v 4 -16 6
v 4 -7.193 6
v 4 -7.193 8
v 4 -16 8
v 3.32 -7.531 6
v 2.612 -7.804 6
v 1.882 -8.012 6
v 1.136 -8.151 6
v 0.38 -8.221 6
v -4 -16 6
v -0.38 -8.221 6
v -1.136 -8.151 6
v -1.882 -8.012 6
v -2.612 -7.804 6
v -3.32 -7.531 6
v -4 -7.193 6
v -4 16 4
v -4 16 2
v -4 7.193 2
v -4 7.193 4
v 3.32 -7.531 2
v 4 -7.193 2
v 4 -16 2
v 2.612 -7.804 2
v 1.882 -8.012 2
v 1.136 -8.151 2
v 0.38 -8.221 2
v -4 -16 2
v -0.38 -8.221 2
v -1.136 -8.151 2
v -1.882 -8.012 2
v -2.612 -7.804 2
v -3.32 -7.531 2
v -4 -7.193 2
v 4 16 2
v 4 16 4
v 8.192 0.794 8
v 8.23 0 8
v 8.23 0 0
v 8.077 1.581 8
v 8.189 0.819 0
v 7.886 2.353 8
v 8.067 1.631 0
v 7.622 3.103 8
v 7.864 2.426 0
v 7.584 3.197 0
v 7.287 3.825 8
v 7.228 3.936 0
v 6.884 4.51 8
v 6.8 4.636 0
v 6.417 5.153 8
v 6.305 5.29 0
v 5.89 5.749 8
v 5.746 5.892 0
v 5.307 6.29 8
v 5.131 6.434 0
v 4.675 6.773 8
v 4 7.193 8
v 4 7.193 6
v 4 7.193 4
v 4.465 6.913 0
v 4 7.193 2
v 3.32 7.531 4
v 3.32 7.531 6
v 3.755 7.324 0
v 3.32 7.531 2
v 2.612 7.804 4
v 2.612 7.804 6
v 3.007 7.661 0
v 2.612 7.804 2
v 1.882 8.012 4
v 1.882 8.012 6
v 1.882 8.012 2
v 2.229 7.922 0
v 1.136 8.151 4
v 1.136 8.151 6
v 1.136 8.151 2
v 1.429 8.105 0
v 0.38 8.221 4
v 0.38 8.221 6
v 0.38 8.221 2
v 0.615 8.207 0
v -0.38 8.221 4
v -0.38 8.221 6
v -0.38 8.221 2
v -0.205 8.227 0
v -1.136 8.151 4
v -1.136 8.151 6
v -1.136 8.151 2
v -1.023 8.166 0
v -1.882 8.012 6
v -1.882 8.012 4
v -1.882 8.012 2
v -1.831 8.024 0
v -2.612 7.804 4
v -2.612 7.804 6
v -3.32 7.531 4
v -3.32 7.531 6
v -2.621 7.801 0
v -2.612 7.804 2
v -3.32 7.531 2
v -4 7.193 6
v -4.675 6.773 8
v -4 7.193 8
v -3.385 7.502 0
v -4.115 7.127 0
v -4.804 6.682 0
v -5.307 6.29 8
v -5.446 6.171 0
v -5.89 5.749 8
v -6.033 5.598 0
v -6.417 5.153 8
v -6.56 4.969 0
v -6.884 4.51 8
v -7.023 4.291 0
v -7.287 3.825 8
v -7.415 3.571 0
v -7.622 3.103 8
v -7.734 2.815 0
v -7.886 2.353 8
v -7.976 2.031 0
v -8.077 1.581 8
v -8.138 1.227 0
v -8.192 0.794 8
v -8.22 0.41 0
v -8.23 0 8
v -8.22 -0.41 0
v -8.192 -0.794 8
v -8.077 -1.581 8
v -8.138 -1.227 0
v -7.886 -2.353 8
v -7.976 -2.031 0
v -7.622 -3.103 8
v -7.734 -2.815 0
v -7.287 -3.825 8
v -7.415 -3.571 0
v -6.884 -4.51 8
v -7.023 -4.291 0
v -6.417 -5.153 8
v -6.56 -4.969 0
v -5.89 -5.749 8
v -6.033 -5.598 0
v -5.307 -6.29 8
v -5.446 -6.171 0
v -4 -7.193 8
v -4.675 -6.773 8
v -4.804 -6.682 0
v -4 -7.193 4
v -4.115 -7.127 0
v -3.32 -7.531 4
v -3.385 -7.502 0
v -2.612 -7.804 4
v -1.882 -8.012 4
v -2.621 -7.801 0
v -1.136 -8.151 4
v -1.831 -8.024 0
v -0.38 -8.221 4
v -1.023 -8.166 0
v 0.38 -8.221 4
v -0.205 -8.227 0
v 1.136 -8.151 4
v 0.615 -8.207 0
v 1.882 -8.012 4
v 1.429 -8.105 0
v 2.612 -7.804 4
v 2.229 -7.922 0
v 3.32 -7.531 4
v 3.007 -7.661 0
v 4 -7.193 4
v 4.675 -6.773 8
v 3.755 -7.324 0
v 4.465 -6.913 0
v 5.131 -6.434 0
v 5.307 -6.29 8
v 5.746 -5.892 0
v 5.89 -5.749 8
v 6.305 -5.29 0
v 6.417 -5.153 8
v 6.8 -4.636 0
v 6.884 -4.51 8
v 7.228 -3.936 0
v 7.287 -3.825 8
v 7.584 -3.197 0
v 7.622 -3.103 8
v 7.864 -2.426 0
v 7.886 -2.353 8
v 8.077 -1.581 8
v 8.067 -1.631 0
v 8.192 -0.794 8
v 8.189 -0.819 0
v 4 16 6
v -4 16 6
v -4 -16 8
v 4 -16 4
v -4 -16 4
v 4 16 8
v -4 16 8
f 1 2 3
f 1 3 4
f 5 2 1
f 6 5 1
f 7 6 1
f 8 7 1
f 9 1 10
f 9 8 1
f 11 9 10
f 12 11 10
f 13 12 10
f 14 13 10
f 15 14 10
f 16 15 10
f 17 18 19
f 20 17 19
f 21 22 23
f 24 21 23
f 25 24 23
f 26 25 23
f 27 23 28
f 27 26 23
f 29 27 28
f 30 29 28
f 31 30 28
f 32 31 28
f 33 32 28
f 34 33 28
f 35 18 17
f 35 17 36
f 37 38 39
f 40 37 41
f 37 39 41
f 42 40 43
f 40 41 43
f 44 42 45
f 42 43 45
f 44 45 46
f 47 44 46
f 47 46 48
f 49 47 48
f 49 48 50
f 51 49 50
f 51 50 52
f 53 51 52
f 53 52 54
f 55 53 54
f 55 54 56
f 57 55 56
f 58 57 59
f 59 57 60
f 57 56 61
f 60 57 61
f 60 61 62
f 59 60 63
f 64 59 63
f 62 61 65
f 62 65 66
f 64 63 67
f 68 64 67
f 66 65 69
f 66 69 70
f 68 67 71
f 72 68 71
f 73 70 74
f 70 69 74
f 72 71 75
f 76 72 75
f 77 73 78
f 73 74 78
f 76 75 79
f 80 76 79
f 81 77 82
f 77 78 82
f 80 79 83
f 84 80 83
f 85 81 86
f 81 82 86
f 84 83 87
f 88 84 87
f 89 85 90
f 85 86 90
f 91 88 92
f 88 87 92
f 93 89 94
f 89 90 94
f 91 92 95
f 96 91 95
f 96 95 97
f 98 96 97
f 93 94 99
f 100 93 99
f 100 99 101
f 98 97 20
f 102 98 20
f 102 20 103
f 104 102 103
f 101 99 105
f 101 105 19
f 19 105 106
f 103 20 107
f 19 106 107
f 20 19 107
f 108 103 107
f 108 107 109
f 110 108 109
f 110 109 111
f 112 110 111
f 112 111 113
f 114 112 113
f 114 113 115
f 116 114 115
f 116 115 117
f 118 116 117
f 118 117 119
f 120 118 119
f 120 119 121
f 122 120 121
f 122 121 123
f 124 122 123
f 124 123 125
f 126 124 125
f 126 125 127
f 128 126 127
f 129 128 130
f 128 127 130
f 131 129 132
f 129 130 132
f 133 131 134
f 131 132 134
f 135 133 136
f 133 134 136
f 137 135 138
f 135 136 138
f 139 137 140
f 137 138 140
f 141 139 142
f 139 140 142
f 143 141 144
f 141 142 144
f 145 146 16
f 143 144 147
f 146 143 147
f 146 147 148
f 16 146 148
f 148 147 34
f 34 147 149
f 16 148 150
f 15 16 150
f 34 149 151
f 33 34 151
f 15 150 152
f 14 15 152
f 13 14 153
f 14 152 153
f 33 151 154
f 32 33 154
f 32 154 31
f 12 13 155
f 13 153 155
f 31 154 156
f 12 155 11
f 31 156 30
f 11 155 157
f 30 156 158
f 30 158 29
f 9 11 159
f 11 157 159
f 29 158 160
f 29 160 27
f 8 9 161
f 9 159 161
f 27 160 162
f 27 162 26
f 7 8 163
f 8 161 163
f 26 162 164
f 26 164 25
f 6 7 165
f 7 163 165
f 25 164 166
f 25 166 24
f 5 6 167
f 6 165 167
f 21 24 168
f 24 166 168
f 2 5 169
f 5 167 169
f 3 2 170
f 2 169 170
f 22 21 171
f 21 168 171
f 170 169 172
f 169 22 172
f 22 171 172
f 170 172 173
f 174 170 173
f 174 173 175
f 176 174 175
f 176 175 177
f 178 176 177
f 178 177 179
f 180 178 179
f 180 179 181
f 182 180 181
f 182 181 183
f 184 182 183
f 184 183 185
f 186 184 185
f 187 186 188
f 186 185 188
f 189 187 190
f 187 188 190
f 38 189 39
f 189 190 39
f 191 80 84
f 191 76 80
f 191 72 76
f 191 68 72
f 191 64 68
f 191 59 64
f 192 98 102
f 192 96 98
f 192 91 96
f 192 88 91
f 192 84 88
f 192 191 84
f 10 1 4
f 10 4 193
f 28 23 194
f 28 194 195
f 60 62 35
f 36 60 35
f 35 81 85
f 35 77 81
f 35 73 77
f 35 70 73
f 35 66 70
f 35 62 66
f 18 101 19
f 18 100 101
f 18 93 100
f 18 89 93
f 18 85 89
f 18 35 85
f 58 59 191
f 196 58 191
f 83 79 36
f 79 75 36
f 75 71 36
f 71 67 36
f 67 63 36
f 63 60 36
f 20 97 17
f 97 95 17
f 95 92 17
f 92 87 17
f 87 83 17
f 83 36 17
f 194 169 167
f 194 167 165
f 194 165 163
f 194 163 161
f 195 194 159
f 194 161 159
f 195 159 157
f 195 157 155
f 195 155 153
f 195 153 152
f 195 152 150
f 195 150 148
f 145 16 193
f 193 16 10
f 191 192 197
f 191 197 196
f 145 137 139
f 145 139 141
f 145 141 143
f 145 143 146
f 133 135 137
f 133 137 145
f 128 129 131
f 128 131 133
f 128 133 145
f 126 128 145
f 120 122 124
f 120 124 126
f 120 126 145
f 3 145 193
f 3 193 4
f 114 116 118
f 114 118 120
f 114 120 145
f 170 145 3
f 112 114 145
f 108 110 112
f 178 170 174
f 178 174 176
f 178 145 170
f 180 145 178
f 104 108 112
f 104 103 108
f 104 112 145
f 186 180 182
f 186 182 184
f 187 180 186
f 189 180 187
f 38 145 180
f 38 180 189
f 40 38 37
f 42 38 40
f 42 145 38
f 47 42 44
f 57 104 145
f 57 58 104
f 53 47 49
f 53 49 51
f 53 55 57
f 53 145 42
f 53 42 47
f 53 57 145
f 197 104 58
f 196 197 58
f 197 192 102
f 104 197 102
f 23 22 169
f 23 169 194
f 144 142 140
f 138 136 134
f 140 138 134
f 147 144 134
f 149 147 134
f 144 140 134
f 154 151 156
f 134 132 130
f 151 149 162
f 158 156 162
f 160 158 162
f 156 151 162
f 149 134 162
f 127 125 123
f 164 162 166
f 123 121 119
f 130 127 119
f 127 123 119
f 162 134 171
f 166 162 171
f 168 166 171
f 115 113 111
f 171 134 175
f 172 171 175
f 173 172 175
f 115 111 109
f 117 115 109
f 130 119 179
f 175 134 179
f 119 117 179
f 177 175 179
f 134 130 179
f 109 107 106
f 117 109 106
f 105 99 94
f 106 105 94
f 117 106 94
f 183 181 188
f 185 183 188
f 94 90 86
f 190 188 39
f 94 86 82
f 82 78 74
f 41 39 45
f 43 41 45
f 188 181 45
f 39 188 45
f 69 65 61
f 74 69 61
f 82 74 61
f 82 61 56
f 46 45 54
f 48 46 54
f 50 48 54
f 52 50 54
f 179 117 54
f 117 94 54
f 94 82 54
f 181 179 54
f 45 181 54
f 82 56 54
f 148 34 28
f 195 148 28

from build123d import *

# Parameters (mm, degrees)
SKETCH004_R      = 8.23
EXTRUDE004_DEPTH = 8
EXTRUDE005_DEPTH = 2
ARRAY_Z_COUNT    = 2
ARRAY_Z_PITCH    = 4


with BuildPart() as eixo1:
    # Sketch004 → Extrude004 (new body)
    with BuildSketch(Plane.XY):
        Circle(SKETCH004_R)
    extrude(amount=EXTRUDE004_DEPTH)


with BuildPart() as eixo_maior:
    # Sketch005 (on Face8 of Extrude002) → Extrude005 (new body)
    with BuildSketch(Plane.XY.offset(2)):
        with BuildLine():
            Line((-4, 16), (4, 16))
            Line((4, 6.9282032303), (4, 16))
            ThreePointArc((4, -6.9282032303), (8, 0), (4, 6.9282032303))
            Line((4, -6.9282032303), (4, -16))
            Line((4, -16), (-4, -16))
            Line((-4, -6.9282032303), (-4, -16))
            ThreePointArc((-4, 6.9282032303), (-8, 0), (-4, -6.9282032303))
            Line((-4, 16), (-4, 6.9282032303))
        make_face()
    extrude(amount=EXTRUDE005_DEPTH)

    # Array Z: Eixo Maior ×2


with BuildPart() as eixo_maior_1:
    add(eixo_maior.part)
    with Locations(*[(0, 0, i * ARRAY_Z_PITCH) for i in range(1, ARRAY_Z_COUNT)]):
        add(eixo_maior.part)

    # Fusion001: union Eixo1
    add(eixo1.part)


solid = eixo_maior_1.part
